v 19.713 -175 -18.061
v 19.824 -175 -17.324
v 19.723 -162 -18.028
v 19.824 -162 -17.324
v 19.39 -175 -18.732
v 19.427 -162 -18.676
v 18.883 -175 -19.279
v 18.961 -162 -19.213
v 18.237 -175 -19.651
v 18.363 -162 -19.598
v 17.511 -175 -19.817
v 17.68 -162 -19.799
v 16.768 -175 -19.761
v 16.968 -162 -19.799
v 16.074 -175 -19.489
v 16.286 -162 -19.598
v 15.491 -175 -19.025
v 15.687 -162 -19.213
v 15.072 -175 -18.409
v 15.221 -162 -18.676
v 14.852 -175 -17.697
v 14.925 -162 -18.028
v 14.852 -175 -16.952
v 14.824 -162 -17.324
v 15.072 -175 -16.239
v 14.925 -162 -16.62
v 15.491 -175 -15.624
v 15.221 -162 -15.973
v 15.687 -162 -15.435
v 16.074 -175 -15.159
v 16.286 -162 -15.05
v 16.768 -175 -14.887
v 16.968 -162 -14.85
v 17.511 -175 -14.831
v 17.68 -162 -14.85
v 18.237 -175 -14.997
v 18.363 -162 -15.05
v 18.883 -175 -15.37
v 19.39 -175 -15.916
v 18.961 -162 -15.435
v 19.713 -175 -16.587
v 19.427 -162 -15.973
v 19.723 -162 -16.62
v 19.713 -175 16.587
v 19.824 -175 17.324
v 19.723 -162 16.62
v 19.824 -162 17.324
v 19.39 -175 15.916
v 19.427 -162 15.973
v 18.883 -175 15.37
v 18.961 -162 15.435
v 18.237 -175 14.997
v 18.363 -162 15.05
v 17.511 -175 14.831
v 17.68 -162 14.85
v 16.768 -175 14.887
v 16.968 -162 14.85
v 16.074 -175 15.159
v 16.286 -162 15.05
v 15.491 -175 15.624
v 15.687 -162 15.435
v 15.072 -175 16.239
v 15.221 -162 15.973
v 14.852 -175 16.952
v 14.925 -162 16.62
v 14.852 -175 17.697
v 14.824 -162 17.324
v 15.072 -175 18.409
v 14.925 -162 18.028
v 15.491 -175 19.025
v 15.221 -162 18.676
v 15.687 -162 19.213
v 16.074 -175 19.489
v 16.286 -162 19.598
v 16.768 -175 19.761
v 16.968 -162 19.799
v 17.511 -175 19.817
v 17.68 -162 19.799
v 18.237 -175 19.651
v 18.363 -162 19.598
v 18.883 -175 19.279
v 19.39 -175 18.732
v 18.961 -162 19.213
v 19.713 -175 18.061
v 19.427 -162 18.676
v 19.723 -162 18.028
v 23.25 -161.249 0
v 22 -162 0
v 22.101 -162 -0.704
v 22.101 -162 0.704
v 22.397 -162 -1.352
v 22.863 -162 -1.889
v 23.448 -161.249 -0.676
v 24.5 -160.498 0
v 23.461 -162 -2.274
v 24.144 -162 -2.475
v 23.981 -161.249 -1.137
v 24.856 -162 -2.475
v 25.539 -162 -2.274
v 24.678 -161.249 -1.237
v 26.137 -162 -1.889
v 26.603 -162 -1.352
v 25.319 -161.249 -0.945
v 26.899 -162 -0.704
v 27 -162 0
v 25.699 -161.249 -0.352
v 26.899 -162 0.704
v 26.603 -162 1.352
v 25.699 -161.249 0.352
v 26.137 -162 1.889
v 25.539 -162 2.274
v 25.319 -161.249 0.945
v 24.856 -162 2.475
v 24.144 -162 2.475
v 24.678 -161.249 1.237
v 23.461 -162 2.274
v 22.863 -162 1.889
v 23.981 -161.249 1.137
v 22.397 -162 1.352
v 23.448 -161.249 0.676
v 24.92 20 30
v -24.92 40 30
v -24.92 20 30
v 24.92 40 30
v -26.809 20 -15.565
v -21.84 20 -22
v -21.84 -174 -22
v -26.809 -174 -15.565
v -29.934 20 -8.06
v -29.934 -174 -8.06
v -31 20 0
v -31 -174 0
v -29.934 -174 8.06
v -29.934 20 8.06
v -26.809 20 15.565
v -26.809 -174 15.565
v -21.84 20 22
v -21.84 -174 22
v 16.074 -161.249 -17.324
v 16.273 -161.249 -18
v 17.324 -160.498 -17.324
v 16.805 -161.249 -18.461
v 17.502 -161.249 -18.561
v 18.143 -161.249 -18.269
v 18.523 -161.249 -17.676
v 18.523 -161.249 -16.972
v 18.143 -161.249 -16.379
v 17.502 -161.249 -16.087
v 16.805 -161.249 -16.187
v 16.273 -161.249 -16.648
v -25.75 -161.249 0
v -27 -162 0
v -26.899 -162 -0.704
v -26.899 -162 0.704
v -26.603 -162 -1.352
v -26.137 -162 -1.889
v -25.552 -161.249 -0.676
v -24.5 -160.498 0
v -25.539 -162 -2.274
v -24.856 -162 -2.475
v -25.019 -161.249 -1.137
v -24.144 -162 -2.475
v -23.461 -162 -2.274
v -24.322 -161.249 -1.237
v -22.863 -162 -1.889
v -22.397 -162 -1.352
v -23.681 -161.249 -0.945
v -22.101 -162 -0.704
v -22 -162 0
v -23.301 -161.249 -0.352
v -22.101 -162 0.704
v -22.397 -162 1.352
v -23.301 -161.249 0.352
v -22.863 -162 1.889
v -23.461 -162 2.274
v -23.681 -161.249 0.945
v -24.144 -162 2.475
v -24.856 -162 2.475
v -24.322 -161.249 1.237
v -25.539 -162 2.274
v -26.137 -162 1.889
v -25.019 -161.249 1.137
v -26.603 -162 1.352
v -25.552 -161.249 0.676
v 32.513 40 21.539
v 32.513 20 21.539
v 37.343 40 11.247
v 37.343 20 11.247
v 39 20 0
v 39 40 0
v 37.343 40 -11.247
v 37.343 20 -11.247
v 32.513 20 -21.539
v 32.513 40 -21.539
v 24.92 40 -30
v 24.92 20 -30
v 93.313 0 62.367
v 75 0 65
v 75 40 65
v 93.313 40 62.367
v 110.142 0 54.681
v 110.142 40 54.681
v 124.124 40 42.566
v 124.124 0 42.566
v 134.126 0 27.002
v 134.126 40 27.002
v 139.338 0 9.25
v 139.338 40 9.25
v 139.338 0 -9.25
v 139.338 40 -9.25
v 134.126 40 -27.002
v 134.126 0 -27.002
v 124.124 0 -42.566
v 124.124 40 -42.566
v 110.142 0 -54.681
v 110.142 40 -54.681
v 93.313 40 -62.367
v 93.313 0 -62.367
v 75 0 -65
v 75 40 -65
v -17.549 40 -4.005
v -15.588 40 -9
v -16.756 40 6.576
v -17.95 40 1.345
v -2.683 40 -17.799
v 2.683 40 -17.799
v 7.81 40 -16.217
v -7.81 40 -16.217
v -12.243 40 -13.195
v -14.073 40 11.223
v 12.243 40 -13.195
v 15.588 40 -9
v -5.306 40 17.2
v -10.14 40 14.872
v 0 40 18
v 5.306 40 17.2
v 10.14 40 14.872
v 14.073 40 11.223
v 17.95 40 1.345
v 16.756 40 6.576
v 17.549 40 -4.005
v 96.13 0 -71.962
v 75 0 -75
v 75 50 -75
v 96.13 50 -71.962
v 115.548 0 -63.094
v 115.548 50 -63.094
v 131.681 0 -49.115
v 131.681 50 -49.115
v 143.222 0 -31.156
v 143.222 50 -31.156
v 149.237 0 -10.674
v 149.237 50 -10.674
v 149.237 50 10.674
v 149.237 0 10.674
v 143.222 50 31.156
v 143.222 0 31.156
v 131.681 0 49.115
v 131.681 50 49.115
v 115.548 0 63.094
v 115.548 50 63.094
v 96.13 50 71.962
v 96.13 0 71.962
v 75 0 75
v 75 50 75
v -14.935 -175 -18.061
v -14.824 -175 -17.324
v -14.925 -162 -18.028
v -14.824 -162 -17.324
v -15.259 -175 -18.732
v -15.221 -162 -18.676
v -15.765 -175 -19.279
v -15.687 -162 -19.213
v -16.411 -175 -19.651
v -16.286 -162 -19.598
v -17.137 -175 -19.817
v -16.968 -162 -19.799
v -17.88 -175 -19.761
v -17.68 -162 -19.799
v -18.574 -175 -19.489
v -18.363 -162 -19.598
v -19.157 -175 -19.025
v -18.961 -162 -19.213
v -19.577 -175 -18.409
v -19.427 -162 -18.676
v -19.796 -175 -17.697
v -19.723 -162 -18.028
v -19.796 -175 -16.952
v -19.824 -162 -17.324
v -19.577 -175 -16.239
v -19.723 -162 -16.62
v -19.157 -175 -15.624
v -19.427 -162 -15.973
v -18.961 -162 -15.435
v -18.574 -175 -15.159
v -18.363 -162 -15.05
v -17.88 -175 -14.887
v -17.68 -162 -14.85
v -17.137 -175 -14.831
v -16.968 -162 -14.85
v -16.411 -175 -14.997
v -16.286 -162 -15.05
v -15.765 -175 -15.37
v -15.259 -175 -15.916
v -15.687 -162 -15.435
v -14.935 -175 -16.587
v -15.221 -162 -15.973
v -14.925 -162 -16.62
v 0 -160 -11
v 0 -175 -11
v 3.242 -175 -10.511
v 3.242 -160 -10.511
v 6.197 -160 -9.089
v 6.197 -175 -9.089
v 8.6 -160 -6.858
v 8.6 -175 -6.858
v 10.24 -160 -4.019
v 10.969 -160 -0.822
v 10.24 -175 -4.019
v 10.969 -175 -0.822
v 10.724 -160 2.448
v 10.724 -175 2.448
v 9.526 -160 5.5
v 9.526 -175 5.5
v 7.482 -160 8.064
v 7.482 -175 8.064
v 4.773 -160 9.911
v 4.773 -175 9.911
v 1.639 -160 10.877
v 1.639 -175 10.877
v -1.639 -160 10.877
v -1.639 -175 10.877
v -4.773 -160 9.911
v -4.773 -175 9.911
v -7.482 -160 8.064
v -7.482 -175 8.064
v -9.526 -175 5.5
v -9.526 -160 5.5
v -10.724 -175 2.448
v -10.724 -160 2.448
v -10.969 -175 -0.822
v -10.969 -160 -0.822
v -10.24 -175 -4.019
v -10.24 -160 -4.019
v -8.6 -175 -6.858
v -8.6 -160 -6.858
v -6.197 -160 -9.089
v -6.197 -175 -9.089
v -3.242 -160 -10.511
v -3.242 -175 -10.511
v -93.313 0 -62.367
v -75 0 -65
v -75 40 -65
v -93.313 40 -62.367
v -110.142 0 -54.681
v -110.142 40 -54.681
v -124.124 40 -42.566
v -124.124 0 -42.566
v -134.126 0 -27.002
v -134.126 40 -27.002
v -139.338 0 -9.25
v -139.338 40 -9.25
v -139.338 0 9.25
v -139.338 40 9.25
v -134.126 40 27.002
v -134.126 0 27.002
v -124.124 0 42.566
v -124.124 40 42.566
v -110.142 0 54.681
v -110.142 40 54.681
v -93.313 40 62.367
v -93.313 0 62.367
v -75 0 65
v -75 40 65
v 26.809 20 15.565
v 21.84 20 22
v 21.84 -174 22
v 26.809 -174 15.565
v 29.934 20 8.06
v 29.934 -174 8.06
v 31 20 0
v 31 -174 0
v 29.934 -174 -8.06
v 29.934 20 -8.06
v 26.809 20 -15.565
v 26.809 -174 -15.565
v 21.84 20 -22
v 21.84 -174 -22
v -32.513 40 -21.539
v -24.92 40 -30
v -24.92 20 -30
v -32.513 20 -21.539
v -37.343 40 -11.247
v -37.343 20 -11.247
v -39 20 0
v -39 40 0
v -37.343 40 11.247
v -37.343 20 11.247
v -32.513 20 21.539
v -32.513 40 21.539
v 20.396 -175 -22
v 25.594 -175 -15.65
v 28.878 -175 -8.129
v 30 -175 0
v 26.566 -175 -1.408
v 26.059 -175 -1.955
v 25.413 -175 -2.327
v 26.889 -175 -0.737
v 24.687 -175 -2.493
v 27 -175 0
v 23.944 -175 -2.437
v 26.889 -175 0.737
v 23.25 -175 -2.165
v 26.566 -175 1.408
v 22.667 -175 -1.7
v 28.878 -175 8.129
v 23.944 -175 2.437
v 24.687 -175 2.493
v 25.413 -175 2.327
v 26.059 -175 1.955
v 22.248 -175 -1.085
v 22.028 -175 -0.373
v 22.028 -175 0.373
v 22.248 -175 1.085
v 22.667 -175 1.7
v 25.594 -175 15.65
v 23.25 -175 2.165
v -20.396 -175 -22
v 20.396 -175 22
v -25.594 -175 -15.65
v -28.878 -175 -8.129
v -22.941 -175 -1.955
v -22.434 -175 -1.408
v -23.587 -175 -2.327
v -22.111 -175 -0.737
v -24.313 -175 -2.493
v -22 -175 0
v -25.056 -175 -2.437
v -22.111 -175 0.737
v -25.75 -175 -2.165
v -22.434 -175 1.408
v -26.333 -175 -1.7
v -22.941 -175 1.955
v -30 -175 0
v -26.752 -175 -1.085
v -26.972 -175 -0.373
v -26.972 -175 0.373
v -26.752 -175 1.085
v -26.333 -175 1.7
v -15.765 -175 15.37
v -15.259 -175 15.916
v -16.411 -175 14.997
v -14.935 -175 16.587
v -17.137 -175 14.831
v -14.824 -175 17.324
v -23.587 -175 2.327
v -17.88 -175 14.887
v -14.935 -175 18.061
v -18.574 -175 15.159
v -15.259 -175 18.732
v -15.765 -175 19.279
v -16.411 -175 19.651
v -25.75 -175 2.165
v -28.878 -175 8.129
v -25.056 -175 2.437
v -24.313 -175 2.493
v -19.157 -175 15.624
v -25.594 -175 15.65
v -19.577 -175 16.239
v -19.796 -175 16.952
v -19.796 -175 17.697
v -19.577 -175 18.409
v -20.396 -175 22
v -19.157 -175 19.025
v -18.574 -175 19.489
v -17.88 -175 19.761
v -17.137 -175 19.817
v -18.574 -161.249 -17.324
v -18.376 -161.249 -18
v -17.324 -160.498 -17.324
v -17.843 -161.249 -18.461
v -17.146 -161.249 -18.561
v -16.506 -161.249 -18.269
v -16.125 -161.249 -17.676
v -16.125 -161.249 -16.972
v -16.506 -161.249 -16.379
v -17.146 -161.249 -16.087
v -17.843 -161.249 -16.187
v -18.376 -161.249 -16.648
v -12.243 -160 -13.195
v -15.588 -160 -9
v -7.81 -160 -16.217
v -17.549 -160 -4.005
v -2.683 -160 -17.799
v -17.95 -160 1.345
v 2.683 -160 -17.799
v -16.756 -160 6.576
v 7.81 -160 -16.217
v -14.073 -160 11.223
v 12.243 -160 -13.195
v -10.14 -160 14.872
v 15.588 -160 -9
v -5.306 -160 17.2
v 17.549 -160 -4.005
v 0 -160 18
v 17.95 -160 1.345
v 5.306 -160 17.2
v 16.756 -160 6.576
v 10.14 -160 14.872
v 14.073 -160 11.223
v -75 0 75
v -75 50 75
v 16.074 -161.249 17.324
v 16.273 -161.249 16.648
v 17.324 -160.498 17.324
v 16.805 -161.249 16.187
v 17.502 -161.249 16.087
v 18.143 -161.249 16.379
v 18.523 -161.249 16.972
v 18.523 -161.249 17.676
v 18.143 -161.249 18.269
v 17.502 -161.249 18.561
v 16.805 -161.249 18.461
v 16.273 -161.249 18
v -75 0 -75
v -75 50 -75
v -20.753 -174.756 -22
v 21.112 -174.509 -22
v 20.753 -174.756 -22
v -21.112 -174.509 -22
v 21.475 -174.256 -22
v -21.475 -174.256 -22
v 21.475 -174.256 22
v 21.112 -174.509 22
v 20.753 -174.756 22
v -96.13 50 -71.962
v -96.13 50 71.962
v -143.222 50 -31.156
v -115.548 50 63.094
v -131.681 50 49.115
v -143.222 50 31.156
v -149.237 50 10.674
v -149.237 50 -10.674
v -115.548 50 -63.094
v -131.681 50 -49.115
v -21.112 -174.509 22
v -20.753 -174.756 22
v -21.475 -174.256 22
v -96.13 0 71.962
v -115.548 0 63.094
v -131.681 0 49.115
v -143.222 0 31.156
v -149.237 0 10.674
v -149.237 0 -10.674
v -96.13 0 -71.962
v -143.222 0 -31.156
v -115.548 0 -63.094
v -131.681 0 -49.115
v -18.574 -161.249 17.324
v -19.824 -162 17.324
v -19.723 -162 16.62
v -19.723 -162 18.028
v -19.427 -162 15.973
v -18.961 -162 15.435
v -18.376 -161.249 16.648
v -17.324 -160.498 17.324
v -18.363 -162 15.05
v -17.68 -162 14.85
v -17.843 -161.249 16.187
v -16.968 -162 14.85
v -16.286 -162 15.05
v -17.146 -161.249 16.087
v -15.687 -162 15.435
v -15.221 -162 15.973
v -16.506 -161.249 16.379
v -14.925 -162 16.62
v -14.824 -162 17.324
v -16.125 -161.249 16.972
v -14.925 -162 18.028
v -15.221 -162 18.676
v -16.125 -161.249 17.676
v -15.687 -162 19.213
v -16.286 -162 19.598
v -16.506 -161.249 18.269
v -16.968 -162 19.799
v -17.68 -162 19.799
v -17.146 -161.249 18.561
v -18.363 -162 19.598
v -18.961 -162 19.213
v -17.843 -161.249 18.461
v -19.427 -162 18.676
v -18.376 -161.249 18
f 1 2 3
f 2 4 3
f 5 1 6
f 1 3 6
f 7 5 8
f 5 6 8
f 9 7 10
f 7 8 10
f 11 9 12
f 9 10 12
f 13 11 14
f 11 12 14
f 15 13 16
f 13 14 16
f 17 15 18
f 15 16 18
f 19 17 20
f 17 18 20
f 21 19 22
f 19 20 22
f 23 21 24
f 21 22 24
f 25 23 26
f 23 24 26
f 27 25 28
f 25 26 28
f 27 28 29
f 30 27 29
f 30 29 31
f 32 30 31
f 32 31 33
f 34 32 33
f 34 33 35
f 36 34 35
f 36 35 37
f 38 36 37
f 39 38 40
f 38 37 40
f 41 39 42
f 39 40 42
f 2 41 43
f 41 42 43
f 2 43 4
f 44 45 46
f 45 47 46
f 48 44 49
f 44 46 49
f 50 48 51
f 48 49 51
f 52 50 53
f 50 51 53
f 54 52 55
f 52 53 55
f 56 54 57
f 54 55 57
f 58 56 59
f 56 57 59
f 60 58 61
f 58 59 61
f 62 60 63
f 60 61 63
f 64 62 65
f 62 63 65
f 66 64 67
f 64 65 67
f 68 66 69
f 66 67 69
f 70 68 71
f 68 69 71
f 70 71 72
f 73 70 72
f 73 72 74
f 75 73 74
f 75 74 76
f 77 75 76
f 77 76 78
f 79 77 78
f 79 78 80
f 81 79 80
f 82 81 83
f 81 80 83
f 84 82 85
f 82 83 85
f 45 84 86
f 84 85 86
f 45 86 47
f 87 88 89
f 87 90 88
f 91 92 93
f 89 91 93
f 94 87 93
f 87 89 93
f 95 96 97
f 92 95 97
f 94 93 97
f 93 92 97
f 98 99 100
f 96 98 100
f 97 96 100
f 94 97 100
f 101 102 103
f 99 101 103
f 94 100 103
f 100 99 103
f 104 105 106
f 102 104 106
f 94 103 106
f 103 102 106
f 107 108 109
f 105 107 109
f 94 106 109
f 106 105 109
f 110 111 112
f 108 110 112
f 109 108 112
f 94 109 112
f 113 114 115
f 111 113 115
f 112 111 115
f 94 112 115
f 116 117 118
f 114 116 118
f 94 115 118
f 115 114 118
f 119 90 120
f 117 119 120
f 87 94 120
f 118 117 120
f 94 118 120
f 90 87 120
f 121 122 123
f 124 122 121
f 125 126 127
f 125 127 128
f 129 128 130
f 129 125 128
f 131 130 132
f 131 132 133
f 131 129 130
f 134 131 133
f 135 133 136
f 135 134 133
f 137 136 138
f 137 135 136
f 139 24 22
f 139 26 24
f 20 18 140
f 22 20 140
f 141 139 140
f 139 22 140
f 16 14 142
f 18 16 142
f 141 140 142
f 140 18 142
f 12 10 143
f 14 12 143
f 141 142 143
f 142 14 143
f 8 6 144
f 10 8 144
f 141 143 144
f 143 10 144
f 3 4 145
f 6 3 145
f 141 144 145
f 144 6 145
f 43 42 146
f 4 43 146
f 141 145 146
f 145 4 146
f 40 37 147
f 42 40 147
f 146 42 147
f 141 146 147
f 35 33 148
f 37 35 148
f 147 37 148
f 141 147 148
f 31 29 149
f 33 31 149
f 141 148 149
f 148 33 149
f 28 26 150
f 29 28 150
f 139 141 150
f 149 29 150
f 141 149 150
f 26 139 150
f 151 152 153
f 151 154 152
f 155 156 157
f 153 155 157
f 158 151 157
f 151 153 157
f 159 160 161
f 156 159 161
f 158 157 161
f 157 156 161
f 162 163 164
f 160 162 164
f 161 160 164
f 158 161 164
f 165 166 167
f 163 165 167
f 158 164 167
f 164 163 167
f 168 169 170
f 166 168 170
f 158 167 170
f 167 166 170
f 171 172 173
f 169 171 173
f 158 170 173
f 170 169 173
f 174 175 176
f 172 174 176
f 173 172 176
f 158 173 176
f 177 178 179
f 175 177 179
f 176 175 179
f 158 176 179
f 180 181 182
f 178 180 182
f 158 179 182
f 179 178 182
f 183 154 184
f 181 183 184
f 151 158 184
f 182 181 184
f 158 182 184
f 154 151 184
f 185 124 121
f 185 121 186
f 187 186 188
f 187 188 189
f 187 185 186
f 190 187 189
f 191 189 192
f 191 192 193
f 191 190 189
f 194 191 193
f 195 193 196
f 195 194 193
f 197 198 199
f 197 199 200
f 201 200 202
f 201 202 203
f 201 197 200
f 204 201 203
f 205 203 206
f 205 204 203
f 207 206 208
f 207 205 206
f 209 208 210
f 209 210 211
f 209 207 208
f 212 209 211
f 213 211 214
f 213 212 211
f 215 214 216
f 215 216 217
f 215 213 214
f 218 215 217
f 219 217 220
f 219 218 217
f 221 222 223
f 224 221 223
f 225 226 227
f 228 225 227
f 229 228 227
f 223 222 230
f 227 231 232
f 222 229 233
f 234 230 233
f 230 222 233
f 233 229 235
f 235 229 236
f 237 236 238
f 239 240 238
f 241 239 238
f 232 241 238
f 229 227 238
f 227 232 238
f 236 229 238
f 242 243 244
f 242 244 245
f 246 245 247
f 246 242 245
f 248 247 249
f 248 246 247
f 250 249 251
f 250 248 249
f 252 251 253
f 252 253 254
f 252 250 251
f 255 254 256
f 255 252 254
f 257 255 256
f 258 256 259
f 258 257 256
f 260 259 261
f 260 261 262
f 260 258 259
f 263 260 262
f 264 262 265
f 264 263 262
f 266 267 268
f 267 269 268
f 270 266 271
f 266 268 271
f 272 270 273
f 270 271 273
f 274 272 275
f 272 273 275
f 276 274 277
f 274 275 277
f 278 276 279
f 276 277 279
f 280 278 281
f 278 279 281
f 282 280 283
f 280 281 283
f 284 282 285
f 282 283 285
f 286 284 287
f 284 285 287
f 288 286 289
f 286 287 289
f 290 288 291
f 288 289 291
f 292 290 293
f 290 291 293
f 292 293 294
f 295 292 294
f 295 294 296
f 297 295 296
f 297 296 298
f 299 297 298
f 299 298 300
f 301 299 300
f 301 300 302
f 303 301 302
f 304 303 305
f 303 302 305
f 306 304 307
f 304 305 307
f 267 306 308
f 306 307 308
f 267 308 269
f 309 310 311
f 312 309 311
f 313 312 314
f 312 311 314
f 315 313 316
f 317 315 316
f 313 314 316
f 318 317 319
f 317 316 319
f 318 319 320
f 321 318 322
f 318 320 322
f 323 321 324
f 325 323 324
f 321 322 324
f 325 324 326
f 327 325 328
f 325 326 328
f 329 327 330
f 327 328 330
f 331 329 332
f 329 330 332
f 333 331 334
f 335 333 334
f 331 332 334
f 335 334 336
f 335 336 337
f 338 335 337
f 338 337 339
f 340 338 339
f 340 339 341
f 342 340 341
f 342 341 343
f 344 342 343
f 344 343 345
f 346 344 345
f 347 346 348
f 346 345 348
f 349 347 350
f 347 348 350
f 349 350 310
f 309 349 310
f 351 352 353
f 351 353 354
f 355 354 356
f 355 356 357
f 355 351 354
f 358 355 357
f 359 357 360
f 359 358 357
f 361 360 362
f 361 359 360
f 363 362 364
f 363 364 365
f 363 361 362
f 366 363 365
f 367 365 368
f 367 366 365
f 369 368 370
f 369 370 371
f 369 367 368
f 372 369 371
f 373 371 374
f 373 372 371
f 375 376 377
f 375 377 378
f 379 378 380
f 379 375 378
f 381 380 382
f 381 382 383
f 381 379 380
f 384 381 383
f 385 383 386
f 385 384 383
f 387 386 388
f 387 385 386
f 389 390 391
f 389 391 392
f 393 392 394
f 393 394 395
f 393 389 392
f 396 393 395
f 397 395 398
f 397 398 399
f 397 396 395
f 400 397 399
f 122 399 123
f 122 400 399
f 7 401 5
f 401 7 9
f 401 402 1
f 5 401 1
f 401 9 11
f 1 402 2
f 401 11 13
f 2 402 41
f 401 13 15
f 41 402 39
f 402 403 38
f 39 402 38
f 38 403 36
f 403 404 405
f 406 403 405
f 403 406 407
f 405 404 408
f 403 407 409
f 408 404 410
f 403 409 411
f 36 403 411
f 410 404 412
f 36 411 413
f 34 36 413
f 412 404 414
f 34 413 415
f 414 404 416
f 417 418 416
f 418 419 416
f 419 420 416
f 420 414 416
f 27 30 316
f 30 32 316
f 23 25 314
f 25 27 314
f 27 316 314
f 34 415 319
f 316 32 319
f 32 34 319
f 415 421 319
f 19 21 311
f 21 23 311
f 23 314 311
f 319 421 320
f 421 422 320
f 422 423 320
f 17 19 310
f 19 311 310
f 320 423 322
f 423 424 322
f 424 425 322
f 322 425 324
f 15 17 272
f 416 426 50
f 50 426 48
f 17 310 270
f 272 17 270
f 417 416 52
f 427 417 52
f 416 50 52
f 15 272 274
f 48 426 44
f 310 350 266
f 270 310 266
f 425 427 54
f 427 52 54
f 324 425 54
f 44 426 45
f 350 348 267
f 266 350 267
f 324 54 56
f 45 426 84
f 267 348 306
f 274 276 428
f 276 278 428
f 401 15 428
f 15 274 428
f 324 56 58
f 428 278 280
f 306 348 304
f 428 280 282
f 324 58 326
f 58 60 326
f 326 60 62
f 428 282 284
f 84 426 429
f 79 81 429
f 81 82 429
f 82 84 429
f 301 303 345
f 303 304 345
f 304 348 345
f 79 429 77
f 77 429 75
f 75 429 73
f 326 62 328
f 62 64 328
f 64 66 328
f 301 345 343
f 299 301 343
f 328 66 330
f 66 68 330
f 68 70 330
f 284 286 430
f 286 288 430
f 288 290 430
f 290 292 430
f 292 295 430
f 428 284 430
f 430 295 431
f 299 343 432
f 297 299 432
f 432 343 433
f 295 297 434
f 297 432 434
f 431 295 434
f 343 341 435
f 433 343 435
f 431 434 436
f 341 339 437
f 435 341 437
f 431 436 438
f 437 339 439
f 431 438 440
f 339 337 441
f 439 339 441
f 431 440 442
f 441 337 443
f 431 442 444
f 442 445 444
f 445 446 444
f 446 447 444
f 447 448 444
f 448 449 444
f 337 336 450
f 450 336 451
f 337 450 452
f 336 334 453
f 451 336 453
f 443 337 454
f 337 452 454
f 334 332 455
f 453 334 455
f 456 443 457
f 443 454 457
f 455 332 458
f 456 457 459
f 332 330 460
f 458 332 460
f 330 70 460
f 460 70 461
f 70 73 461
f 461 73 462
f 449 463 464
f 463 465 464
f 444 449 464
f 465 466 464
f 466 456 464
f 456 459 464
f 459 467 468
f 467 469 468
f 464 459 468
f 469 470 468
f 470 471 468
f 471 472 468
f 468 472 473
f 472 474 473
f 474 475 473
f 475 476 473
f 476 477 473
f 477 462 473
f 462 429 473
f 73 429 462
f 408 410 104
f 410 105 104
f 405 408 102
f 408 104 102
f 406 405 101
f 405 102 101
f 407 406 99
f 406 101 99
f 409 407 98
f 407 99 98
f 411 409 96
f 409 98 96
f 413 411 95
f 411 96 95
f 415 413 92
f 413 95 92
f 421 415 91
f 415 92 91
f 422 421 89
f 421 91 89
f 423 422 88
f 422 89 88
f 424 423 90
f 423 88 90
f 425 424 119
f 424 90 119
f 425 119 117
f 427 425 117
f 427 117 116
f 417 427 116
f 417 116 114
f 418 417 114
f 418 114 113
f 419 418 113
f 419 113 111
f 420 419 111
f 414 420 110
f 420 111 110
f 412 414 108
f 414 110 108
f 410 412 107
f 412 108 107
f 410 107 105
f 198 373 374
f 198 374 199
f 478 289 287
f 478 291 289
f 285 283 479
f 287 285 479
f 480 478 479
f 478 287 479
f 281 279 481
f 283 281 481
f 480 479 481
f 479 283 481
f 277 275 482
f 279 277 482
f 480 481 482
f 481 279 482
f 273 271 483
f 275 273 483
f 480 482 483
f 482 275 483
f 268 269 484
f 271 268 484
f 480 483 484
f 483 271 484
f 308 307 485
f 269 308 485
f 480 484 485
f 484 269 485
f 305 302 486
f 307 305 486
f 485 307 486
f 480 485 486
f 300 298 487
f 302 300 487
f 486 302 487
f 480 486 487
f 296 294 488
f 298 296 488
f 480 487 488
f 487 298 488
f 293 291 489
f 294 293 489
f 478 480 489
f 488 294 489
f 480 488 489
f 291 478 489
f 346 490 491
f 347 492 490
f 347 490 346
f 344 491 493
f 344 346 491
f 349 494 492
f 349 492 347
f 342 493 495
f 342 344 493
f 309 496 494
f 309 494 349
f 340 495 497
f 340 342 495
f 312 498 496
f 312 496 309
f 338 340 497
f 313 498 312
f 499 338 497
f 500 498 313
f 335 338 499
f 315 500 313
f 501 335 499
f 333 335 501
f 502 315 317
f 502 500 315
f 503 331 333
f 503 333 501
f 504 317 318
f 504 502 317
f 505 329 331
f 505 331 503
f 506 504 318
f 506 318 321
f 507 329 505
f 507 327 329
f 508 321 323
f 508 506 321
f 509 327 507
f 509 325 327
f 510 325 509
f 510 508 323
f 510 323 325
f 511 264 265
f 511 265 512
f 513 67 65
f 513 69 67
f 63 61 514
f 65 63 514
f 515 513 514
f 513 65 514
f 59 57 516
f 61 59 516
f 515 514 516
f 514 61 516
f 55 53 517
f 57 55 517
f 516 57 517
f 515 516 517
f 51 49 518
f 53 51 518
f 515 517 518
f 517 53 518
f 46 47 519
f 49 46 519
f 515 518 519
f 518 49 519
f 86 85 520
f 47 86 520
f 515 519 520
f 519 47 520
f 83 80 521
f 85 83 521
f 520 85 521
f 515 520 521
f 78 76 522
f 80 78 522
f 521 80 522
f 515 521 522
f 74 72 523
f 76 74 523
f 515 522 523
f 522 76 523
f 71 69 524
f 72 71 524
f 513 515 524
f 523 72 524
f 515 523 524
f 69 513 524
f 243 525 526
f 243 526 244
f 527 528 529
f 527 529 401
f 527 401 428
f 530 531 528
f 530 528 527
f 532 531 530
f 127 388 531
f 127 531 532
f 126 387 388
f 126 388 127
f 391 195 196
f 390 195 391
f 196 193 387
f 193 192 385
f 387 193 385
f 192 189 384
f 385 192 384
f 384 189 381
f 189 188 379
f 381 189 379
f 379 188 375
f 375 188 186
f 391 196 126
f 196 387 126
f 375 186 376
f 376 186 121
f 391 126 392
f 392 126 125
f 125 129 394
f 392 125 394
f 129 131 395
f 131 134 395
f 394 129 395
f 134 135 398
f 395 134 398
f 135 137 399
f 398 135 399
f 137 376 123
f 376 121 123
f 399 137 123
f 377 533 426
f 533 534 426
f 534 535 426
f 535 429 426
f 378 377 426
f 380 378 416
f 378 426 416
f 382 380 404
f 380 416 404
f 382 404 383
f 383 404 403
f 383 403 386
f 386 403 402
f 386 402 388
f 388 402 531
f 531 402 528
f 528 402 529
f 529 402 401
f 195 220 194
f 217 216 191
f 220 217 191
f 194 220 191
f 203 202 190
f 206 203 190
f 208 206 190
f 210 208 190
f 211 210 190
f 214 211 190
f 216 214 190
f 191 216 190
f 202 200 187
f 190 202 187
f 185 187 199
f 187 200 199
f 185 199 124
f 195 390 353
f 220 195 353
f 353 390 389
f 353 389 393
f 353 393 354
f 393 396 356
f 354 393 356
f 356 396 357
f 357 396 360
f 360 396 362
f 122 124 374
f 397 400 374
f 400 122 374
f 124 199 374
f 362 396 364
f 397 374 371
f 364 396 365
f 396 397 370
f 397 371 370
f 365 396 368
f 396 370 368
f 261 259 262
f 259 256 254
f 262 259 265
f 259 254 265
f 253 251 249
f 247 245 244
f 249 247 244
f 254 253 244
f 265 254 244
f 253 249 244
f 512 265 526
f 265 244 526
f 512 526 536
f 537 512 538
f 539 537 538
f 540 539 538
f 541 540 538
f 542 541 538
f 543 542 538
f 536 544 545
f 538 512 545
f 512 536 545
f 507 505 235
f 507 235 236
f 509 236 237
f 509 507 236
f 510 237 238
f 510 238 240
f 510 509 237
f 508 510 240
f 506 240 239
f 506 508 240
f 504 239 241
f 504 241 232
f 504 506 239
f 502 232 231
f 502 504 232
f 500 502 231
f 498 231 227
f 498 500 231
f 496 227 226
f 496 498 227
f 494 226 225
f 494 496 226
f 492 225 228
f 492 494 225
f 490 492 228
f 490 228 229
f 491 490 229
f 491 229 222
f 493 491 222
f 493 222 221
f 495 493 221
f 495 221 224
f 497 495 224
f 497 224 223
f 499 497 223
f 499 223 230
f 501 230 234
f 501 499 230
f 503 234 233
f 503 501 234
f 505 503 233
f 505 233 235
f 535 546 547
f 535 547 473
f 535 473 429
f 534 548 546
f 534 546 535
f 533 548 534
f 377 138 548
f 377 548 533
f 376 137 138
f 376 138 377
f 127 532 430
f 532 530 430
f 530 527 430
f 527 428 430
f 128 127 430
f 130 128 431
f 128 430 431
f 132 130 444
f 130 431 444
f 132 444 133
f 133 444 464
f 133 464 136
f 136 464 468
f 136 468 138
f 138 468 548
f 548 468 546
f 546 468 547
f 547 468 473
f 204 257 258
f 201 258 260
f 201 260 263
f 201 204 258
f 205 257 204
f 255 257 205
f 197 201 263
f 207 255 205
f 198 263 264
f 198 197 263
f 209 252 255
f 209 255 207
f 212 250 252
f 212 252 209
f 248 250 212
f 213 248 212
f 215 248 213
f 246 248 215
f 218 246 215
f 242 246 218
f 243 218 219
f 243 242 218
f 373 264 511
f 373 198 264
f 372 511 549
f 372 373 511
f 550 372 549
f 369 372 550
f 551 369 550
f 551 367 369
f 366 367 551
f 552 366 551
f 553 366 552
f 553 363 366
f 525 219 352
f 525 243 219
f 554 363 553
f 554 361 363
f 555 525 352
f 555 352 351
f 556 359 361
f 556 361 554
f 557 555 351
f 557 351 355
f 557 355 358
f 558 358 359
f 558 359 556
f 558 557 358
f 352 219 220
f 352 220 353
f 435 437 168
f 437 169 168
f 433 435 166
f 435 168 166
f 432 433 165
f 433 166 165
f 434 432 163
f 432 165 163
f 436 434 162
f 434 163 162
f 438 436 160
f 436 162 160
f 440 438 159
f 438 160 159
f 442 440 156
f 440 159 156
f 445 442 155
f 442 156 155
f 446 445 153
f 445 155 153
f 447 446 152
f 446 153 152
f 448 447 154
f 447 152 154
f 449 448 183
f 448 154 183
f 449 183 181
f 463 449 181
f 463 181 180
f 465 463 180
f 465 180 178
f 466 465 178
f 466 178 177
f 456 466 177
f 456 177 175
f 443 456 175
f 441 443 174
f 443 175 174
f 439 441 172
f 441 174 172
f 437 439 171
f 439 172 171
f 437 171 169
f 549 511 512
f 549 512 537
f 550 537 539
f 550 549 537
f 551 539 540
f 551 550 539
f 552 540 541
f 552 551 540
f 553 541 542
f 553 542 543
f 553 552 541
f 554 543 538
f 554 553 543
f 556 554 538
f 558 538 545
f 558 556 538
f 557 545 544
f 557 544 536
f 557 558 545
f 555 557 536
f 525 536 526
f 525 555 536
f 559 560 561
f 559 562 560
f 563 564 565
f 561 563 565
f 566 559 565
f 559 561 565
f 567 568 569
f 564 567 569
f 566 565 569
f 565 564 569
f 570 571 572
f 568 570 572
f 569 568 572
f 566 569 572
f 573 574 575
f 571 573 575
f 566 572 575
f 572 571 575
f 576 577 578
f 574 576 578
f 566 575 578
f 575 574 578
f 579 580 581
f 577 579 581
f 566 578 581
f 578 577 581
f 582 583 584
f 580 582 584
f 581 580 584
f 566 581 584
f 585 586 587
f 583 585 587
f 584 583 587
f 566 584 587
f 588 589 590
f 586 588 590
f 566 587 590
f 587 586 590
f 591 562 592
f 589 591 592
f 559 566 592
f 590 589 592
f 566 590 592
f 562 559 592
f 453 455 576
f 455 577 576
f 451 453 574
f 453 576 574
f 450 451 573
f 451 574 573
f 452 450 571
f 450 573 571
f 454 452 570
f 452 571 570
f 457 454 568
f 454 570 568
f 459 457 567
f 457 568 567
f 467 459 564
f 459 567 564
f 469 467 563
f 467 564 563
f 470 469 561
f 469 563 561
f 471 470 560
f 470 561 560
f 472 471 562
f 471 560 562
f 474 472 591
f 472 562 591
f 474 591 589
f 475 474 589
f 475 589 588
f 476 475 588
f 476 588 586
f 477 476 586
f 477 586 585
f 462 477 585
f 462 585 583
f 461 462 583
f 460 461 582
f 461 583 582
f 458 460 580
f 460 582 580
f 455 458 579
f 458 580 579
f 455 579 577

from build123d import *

# Parameters (mm, degrees)
EXTRUDE_1_DEPTH        = 50
CUT_EXTRUDE_1_DEPTH    = 40
EXTRUDE_2_DEPTH        = 20
EXTRUDE_3_DEPTH        = 195
SKETCH_6_R             = 11
CUT_EXTRUDE_2_DEPTH    = 15
SKETCH_7_R             = 18
CUT_EXTRUDE_3_DEPTH    = 200
HOLE_WIZARD_M6_1_D     = 5
HOLE_WIZARD_M6_1_DEPTH = 13
HOLE_WIZARD_M6_1_TIP   = 1.502151548
CHAMFER_1_SIZE         = 1


with BuildPart() as part:
    # 草图1 → 凸台-拉伸1 (new body)
    with BuildSketch(Plane(origin=(0, 0, 0), x_dir=(1, 0, 0), z_dir=(0, 1, 0))):
        with BuildLine():
            Line((-75, 75), (75, 75))
            ThreePointArc((75, 75), (150, 0), (75, -75))
            Line((75, -75), (-75, -75))
            ThreePointArc((-75, -75), (-150, 0), (-75, 75))
        make_face()
    extrude(amount=EXTRUDE_1_DEPTH)

    # 草图2 → 切除-拉伸1 (cut)
    with BuildSketch(Plane.XZ):
        with BuildLine():
            Line((-75, 65), (75, 65))
            ThreePointArc((75, 65), (140, 0), (75, -65))
            Line((75, -65), (-75, -65))
            ThreePointArc((-75, -65), (-140, 0), (-75, 65))
        make_face()
    extrude(amount=-CUT_EXTRUDE_1_DEPTH, mode=Mode.SUBTRACT)

    # 草图4 → 凸台-拉伸2 (add)
    with BuildSketch(Plane.XZ.offset(-40)):
        with BuildLine():
            Line((-24.919871589, 30), (24.919871589, 30))
            ThreePointArc((24.919871589, 30), (39, 0), (24.919871589, -30))
            Line((24.919871589, -30), (-24.919871589, -30))
            ThreePointArc((-24.919871589, -30), (-39, 0), (-24.919871589, 30))
        make_face()
    extrude(amount=EXTRUDE_2_DEPTH)

    # 草图5 → 凸台-拉伸3 (add)
    with BuildSketch(Plane.XZ.offset(-20)):
        with BuildLine():
            Line((-21.840329668, 22), (21.840329668, 22))
            ThreePointArc((21.840329668, 22), (31, 0), (21.840329668, -22))
            Line((21.840329668, -22), (-21.840329668, -22))
            ThreePointArc((-21.840329668, -22), (-31, 0), (-21.840329668, 22))
        make_face()
    extrude(amount=EXTRUDE_3_DEPTH)

    # 草图6 → 切除-拉伸2 (cut)
    with BuildSketch(Plane.XZ.offset(175)):
        with Locations(Location((0, 0, 0), (0, 0, 270))):
            Circle(SKETCH_6_R)
    extrude(amount=-CUT_EXTRUDE_2_DEPTH, mode=Mode.SUBTRACT)

    # 草图7 → 切除-拉伸3 (cut)
    with BuildSketch(Plane(origin=(0, -160, 0), x_dir=(1, 0, 0), z_dir=(0, 1, 0))):
        with Locations(Location((0, 0, 0), (0, 0, 270))):
            Circle(SKETCH_7_R)
    extrude(amount=CUT_EXTRUDE_3_DEPTH, mode=Mode.SUBTRACT)

    # M6 螺纹孔1
    with Locations(Plane(origin=(0, -175, 0), x_dir=(-1, 0, 0), z_dir=(0, -1, 0))):
        with Locations((24.5, 0), (17.324116139, -17.324116139), (-17.324116139, -17.324116139), (-24.5, 0), (-17.324116139, 17.324116139), (17.324116139, 17.324116139)):
            Hole(HOLE_WIZARD_M6_1_D / 2, depth=HOLE_WIZARD_M6_1_DEPTH)
            with Locations((0, 0, -(HOLE_WIZARD_M6_1_DEPTH + HOLE_WIZARD_M6_1_TIP / 2))):  # 118° drill point
                Cone(0, HOLE_WIZARD_M6_1_D / 2, HOLE_WIZARD_M6_1_TIP, mode=Mode.SUBTRACT)

    # 倒角1
    chamfer_1_edges = [part.edges().sort_by_distance(p)[0] for p in [
        (-31, -175, 0),
        (31, -175, 0),
    ]]
    chamfer(chamfer_1_edges, length=CHAMFER_1_SIZE)


solid = part.part
